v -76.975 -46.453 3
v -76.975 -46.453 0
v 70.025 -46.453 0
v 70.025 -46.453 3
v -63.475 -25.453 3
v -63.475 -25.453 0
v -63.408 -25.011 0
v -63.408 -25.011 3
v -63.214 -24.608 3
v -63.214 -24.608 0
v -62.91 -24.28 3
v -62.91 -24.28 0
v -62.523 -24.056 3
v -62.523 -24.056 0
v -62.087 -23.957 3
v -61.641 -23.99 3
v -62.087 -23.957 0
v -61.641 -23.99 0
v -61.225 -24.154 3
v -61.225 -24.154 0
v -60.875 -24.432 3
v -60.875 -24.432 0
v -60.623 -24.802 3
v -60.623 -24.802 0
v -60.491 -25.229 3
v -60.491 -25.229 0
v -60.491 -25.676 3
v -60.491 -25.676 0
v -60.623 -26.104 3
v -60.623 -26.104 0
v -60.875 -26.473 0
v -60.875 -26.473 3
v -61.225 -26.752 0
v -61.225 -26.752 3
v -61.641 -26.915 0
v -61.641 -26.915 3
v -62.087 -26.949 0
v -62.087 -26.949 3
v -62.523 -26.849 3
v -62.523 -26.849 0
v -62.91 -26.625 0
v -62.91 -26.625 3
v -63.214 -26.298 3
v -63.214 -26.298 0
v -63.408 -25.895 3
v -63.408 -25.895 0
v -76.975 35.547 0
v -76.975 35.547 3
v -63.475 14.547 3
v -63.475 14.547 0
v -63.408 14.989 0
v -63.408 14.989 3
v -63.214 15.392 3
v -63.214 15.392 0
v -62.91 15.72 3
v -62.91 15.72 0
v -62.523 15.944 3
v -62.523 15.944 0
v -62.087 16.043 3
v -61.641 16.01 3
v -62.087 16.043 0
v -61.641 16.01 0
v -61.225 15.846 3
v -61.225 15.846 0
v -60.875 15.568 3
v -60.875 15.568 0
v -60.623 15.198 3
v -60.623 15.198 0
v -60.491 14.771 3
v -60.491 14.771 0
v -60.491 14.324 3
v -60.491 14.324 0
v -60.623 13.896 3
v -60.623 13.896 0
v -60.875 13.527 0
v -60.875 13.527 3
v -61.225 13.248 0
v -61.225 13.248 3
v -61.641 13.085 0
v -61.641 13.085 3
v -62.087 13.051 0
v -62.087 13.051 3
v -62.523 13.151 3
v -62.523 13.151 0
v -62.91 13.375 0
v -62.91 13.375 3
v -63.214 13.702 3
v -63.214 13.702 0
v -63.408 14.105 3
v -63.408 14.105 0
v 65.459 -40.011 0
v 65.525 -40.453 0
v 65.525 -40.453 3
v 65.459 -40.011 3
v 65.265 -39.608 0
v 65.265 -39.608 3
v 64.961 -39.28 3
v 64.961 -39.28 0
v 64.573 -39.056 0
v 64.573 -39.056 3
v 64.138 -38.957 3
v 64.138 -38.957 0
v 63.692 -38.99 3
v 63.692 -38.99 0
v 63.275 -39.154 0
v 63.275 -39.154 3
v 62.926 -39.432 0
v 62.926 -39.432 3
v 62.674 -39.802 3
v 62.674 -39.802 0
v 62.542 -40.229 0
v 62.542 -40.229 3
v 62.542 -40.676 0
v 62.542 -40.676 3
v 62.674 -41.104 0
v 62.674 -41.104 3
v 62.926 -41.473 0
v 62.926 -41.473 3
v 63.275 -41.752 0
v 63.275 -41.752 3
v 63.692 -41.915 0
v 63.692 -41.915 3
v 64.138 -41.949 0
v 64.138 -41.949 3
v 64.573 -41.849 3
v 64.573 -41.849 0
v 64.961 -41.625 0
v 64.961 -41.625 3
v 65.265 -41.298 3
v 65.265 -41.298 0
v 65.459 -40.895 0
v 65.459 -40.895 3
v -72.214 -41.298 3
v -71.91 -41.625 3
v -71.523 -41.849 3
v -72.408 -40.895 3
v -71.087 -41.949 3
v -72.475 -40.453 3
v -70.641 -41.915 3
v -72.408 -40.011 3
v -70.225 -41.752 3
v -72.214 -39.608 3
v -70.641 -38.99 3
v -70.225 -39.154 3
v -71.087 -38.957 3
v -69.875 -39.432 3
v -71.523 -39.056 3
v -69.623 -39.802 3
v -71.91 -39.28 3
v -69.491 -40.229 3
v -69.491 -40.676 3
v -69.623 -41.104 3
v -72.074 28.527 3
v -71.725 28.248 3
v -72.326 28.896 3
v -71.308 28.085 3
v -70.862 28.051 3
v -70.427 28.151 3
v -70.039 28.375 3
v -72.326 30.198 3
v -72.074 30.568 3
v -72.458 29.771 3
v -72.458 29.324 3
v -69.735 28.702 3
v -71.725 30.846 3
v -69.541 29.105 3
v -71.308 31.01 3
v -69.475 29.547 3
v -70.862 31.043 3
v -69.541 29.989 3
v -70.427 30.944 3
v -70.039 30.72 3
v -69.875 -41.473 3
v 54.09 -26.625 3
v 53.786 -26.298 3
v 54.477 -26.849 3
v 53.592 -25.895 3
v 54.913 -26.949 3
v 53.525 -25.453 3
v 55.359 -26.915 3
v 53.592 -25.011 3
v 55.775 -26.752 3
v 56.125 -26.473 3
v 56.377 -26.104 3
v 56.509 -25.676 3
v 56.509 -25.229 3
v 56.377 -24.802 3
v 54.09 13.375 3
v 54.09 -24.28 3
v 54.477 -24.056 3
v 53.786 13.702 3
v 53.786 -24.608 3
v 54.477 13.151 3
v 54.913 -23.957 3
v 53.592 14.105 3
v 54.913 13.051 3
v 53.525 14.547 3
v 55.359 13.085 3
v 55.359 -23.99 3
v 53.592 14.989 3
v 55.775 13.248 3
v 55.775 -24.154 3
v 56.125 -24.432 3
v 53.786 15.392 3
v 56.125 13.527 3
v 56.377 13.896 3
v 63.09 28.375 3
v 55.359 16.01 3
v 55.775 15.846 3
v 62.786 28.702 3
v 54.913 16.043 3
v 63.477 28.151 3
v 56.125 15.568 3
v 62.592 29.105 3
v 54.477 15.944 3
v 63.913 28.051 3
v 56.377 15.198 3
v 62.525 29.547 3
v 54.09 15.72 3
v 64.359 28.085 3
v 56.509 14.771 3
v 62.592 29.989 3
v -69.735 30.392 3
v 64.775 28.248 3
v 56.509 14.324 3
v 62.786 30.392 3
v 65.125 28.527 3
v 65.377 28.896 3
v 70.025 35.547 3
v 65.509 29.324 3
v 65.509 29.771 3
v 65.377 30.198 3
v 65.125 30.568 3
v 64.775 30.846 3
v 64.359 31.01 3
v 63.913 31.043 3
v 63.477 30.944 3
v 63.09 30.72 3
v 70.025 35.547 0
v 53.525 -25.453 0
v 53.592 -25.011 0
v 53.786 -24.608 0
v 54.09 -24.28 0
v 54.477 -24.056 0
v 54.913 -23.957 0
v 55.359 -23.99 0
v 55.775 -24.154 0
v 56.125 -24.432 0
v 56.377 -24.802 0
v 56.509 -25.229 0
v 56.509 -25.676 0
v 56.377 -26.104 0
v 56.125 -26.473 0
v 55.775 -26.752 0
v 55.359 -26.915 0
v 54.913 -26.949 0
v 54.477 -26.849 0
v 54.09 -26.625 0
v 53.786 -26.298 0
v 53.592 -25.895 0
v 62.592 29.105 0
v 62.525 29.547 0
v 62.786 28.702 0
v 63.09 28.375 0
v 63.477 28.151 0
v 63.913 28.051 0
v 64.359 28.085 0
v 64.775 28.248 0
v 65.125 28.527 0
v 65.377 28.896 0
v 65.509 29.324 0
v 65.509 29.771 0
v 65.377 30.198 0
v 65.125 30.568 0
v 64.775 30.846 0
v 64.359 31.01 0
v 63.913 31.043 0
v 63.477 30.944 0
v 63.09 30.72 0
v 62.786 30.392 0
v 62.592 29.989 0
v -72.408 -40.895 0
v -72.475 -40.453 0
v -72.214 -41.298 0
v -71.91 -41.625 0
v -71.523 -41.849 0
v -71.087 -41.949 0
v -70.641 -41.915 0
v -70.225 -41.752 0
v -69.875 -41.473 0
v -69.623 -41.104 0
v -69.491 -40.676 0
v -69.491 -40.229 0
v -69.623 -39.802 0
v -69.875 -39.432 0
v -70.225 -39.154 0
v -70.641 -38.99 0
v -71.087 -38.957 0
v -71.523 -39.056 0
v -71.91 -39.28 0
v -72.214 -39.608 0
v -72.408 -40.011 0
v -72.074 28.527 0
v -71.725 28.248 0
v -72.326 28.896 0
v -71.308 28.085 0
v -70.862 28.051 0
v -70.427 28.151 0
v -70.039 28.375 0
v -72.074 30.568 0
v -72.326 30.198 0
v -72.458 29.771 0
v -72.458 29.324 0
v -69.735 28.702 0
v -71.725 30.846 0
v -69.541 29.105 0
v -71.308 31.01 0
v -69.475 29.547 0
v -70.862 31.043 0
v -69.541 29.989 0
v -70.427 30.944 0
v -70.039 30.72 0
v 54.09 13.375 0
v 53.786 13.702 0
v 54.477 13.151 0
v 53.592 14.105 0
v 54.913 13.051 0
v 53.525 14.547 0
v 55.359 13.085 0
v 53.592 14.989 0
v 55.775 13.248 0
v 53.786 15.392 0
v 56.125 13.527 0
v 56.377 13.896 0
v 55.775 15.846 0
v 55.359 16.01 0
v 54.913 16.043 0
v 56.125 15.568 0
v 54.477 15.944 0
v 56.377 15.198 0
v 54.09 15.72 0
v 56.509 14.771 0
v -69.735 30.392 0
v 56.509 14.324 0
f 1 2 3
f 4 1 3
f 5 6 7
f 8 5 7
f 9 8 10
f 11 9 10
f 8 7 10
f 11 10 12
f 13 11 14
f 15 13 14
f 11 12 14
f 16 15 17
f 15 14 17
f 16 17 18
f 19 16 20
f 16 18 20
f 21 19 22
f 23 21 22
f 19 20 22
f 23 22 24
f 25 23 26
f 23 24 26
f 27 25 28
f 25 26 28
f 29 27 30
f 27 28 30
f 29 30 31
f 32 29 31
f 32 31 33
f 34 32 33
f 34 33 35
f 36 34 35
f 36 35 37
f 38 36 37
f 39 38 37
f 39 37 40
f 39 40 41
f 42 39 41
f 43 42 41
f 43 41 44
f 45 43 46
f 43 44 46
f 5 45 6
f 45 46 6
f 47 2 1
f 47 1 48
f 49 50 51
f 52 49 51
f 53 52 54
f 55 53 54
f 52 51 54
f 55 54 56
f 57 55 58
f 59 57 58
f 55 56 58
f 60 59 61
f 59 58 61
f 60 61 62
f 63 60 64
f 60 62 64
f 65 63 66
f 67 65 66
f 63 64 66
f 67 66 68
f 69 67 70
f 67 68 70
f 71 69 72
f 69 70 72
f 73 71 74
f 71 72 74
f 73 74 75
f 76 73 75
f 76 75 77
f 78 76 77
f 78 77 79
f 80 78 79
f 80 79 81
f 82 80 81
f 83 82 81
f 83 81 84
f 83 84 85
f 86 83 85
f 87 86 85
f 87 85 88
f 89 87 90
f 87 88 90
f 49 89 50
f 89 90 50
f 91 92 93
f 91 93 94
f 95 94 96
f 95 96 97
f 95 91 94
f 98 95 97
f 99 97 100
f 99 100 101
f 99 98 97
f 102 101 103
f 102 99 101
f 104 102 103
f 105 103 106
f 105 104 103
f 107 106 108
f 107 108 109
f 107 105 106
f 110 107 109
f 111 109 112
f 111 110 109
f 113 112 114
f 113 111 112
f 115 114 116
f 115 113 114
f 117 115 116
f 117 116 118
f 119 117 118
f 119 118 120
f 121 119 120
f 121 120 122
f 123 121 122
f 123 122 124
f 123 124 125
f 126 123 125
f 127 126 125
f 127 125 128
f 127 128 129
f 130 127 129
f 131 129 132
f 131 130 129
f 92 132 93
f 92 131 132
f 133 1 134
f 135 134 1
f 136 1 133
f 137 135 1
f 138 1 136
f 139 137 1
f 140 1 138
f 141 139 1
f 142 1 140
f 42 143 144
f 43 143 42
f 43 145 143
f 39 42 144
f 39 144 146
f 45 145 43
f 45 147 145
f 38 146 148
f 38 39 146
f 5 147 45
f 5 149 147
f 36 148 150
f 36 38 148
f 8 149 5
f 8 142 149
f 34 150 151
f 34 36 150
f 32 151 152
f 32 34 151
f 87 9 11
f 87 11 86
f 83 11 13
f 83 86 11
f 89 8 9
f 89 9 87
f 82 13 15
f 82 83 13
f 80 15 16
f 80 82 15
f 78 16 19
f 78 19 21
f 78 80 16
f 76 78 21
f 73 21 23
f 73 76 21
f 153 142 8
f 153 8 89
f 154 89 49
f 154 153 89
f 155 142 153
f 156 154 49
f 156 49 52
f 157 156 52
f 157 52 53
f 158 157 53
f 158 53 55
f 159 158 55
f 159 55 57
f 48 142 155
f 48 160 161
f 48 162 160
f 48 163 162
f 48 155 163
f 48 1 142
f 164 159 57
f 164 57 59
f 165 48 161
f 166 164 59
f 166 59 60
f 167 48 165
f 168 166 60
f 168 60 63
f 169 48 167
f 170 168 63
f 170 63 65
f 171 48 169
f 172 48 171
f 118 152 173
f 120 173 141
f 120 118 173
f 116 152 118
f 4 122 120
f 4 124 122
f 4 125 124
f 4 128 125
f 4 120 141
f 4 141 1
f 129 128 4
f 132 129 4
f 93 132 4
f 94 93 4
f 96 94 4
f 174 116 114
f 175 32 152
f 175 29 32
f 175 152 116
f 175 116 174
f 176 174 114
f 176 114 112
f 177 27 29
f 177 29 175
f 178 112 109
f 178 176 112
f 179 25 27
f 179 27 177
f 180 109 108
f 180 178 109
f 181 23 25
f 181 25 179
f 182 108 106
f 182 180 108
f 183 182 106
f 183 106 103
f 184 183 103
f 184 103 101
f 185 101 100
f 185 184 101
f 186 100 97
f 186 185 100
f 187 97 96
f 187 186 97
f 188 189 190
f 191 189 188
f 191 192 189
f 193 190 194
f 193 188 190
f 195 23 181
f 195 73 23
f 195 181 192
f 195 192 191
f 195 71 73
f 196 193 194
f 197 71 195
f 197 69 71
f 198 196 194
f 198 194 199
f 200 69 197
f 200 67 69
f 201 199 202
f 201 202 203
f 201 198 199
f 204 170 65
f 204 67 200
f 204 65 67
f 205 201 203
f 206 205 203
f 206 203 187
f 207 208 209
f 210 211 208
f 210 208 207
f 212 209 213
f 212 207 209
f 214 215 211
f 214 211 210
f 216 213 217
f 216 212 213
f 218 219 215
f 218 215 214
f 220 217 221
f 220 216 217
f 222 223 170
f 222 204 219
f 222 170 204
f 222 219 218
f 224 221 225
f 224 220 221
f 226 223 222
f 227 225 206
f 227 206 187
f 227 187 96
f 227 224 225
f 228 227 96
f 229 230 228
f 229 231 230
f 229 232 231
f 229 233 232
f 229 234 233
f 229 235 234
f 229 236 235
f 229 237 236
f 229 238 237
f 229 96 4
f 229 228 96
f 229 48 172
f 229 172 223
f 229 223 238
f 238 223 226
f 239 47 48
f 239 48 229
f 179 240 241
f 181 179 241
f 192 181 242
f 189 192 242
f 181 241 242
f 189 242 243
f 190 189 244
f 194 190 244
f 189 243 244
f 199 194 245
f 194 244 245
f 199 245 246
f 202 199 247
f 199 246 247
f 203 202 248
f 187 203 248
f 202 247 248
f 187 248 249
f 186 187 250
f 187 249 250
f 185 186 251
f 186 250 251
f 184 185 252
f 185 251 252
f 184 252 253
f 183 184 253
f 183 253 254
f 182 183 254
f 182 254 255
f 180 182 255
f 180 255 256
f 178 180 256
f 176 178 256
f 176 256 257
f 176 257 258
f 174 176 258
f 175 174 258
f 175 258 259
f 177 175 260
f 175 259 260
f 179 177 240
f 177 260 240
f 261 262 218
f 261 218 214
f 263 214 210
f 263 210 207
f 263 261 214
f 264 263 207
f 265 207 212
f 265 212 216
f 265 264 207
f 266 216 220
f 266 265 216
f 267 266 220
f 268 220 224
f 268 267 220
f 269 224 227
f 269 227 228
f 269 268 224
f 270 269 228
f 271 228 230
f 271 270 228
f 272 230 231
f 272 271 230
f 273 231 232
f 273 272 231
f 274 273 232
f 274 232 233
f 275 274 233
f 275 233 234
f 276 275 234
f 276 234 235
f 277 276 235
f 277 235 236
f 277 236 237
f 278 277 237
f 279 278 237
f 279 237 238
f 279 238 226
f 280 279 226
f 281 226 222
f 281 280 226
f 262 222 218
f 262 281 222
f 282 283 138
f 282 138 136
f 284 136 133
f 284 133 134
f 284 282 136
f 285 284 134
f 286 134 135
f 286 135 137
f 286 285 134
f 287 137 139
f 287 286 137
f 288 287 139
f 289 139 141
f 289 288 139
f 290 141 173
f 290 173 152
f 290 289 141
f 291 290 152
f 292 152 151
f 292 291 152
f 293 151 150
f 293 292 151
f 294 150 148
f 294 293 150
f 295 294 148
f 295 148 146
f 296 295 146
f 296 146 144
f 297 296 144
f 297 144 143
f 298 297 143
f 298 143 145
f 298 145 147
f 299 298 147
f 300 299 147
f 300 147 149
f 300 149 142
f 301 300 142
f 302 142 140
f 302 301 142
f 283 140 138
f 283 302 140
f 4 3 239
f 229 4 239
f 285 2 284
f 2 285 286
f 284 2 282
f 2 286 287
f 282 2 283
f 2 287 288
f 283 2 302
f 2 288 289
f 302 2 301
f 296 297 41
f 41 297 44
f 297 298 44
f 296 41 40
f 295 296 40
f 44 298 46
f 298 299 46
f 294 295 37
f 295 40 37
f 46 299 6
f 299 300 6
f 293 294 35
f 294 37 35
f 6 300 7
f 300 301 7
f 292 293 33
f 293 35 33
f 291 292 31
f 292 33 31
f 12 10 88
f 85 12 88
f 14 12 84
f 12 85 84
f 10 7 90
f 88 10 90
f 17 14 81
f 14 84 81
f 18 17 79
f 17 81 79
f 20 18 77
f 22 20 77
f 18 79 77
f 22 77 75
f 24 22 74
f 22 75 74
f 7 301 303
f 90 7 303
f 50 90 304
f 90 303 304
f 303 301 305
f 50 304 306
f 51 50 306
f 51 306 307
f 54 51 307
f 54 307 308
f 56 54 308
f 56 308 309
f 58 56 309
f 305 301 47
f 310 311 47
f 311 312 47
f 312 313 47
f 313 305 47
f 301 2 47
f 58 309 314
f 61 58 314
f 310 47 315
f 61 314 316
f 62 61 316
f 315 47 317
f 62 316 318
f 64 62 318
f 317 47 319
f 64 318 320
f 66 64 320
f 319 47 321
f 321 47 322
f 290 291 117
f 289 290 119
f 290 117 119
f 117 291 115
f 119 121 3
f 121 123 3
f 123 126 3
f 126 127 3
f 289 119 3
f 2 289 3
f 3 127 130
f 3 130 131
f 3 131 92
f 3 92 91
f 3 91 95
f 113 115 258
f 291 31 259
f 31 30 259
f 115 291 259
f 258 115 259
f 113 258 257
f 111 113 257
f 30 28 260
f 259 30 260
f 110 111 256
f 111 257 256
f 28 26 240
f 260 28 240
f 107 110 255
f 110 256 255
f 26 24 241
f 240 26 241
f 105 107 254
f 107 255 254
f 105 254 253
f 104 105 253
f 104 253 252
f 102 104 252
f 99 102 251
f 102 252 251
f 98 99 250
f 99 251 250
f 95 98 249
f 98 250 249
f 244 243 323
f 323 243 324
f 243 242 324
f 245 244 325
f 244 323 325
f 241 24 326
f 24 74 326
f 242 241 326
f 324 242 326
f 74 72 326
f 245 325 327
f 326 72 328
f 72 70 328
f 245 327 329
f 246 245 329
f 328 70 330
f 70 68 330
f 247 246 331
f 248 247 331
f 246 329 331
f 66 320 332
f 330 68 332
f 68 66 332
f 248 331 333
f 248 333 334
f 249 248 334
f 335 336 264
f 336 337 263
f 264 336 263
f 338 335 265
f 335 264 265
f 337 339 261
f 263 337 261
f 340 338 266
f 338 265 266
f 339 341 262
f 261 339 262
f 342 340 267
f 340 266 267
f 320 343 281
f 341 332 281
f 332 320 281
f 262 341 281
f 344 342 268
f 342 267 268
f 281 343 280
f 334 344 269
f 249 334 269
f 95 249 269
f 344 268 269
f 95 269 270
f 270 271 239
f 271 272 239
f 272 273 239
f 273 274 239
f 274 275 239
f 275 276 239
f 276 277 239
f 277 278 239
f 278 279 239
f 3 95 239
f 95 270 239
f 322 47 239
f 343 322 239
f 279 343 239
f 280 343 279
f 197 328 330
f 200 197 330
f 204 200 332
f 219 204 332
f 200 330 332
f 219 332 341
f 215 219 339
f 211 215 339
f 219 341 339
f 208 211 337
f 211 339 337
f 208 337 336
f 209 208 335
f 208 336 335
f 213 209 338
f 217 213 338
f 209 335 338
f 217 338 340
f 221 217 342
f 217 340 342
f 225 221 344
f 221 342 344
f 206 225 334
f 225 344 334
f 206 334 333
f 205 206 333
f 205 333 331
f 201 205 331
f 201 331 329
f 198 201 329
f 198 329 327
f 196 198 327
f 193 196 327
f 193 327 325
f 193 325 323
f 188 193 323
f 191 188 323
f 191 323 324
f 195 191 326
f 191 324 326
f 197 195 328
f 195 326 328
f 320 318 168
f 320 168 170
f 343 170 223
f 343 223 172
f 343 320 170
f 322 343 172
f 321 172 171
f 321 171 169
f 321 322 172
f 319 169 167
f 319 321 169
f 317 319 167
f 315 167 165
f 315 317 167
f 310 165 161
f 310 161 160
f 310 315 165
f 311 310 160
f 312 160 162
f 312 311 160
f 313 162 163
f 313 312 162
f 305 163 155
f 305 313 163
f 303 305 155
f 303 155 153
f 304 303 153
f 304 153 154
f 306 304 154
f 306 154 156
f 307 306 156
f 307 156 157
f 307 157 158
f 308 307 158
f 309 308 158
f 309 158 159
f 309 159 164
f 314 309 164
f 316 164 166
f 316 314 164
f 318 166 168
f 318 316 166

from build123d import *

# Parameters (mm, degrees)
SKETCH_1_W          = 147
SKETCH_1_H          = 82
SKETCH_1_R          = 1.5
EXTRUDE_1_DEPTH     = 3
SKETCH_2_R          = 1.5
CUT_EXTRUDE_1_DEPTH = 3


with BuildPart() as part:
    # 草图1 → 凸台-拉伸1 (new body)
    with BuildSketch(Plane.XY):
        with Locations((-3.474545455, -5.452727273)):
            Rectangle(SKETCH_1_W, SKETCH_1_H)
        with Locations((-70.974545455, 29.547272727)):
            Circle(SKETCH_1_R, mode=Mode.SUBTRACT)
        with Locations(Location((64.025454545, 29.547272727, 0), (0, 0, 180))):
            Circle(SKETCH_1_R, mode=Mode.SUBTRACT)
        with Locations((64.025454545, -40.452727273)):
            Circle(SKETCH_1_R, mode=Mode.SUBTRACT)
        with Locations(Location((-70.974545455, -40.452727273, 0), (0, 0, 180))):
            Circle(SKETCH_1_R, mode=Mode.SUBTRACT)
    extrude(amount=EXTRUDE_1_DEPTH)

    # 草图2 → 切除-拉伸1 (cut)
    with BuildSketch(Plane(origin=(0, 0, 0), x_dir=(-1, 0, 0), z_dir=(0, 0, -1))):
        with Locations((-55.025454545, 14.547272727)):
            Circle(SKETCH_2_R)
        with Locations((-55.025454545, -25.452727273)):
            Circle(SKETCH_2_R)
        with Locations((61.974545455, -25.452727273)):
            Circle(SKETCH_2_R)
        with Locations((61.974545455, 14.547272727)):
            Circle(SKETCH_2_R)
    extrude(amount=-CUT_EXTRUDE_1_DEPTH, mode=Mode.SUBTRACT)


solid = part.part
